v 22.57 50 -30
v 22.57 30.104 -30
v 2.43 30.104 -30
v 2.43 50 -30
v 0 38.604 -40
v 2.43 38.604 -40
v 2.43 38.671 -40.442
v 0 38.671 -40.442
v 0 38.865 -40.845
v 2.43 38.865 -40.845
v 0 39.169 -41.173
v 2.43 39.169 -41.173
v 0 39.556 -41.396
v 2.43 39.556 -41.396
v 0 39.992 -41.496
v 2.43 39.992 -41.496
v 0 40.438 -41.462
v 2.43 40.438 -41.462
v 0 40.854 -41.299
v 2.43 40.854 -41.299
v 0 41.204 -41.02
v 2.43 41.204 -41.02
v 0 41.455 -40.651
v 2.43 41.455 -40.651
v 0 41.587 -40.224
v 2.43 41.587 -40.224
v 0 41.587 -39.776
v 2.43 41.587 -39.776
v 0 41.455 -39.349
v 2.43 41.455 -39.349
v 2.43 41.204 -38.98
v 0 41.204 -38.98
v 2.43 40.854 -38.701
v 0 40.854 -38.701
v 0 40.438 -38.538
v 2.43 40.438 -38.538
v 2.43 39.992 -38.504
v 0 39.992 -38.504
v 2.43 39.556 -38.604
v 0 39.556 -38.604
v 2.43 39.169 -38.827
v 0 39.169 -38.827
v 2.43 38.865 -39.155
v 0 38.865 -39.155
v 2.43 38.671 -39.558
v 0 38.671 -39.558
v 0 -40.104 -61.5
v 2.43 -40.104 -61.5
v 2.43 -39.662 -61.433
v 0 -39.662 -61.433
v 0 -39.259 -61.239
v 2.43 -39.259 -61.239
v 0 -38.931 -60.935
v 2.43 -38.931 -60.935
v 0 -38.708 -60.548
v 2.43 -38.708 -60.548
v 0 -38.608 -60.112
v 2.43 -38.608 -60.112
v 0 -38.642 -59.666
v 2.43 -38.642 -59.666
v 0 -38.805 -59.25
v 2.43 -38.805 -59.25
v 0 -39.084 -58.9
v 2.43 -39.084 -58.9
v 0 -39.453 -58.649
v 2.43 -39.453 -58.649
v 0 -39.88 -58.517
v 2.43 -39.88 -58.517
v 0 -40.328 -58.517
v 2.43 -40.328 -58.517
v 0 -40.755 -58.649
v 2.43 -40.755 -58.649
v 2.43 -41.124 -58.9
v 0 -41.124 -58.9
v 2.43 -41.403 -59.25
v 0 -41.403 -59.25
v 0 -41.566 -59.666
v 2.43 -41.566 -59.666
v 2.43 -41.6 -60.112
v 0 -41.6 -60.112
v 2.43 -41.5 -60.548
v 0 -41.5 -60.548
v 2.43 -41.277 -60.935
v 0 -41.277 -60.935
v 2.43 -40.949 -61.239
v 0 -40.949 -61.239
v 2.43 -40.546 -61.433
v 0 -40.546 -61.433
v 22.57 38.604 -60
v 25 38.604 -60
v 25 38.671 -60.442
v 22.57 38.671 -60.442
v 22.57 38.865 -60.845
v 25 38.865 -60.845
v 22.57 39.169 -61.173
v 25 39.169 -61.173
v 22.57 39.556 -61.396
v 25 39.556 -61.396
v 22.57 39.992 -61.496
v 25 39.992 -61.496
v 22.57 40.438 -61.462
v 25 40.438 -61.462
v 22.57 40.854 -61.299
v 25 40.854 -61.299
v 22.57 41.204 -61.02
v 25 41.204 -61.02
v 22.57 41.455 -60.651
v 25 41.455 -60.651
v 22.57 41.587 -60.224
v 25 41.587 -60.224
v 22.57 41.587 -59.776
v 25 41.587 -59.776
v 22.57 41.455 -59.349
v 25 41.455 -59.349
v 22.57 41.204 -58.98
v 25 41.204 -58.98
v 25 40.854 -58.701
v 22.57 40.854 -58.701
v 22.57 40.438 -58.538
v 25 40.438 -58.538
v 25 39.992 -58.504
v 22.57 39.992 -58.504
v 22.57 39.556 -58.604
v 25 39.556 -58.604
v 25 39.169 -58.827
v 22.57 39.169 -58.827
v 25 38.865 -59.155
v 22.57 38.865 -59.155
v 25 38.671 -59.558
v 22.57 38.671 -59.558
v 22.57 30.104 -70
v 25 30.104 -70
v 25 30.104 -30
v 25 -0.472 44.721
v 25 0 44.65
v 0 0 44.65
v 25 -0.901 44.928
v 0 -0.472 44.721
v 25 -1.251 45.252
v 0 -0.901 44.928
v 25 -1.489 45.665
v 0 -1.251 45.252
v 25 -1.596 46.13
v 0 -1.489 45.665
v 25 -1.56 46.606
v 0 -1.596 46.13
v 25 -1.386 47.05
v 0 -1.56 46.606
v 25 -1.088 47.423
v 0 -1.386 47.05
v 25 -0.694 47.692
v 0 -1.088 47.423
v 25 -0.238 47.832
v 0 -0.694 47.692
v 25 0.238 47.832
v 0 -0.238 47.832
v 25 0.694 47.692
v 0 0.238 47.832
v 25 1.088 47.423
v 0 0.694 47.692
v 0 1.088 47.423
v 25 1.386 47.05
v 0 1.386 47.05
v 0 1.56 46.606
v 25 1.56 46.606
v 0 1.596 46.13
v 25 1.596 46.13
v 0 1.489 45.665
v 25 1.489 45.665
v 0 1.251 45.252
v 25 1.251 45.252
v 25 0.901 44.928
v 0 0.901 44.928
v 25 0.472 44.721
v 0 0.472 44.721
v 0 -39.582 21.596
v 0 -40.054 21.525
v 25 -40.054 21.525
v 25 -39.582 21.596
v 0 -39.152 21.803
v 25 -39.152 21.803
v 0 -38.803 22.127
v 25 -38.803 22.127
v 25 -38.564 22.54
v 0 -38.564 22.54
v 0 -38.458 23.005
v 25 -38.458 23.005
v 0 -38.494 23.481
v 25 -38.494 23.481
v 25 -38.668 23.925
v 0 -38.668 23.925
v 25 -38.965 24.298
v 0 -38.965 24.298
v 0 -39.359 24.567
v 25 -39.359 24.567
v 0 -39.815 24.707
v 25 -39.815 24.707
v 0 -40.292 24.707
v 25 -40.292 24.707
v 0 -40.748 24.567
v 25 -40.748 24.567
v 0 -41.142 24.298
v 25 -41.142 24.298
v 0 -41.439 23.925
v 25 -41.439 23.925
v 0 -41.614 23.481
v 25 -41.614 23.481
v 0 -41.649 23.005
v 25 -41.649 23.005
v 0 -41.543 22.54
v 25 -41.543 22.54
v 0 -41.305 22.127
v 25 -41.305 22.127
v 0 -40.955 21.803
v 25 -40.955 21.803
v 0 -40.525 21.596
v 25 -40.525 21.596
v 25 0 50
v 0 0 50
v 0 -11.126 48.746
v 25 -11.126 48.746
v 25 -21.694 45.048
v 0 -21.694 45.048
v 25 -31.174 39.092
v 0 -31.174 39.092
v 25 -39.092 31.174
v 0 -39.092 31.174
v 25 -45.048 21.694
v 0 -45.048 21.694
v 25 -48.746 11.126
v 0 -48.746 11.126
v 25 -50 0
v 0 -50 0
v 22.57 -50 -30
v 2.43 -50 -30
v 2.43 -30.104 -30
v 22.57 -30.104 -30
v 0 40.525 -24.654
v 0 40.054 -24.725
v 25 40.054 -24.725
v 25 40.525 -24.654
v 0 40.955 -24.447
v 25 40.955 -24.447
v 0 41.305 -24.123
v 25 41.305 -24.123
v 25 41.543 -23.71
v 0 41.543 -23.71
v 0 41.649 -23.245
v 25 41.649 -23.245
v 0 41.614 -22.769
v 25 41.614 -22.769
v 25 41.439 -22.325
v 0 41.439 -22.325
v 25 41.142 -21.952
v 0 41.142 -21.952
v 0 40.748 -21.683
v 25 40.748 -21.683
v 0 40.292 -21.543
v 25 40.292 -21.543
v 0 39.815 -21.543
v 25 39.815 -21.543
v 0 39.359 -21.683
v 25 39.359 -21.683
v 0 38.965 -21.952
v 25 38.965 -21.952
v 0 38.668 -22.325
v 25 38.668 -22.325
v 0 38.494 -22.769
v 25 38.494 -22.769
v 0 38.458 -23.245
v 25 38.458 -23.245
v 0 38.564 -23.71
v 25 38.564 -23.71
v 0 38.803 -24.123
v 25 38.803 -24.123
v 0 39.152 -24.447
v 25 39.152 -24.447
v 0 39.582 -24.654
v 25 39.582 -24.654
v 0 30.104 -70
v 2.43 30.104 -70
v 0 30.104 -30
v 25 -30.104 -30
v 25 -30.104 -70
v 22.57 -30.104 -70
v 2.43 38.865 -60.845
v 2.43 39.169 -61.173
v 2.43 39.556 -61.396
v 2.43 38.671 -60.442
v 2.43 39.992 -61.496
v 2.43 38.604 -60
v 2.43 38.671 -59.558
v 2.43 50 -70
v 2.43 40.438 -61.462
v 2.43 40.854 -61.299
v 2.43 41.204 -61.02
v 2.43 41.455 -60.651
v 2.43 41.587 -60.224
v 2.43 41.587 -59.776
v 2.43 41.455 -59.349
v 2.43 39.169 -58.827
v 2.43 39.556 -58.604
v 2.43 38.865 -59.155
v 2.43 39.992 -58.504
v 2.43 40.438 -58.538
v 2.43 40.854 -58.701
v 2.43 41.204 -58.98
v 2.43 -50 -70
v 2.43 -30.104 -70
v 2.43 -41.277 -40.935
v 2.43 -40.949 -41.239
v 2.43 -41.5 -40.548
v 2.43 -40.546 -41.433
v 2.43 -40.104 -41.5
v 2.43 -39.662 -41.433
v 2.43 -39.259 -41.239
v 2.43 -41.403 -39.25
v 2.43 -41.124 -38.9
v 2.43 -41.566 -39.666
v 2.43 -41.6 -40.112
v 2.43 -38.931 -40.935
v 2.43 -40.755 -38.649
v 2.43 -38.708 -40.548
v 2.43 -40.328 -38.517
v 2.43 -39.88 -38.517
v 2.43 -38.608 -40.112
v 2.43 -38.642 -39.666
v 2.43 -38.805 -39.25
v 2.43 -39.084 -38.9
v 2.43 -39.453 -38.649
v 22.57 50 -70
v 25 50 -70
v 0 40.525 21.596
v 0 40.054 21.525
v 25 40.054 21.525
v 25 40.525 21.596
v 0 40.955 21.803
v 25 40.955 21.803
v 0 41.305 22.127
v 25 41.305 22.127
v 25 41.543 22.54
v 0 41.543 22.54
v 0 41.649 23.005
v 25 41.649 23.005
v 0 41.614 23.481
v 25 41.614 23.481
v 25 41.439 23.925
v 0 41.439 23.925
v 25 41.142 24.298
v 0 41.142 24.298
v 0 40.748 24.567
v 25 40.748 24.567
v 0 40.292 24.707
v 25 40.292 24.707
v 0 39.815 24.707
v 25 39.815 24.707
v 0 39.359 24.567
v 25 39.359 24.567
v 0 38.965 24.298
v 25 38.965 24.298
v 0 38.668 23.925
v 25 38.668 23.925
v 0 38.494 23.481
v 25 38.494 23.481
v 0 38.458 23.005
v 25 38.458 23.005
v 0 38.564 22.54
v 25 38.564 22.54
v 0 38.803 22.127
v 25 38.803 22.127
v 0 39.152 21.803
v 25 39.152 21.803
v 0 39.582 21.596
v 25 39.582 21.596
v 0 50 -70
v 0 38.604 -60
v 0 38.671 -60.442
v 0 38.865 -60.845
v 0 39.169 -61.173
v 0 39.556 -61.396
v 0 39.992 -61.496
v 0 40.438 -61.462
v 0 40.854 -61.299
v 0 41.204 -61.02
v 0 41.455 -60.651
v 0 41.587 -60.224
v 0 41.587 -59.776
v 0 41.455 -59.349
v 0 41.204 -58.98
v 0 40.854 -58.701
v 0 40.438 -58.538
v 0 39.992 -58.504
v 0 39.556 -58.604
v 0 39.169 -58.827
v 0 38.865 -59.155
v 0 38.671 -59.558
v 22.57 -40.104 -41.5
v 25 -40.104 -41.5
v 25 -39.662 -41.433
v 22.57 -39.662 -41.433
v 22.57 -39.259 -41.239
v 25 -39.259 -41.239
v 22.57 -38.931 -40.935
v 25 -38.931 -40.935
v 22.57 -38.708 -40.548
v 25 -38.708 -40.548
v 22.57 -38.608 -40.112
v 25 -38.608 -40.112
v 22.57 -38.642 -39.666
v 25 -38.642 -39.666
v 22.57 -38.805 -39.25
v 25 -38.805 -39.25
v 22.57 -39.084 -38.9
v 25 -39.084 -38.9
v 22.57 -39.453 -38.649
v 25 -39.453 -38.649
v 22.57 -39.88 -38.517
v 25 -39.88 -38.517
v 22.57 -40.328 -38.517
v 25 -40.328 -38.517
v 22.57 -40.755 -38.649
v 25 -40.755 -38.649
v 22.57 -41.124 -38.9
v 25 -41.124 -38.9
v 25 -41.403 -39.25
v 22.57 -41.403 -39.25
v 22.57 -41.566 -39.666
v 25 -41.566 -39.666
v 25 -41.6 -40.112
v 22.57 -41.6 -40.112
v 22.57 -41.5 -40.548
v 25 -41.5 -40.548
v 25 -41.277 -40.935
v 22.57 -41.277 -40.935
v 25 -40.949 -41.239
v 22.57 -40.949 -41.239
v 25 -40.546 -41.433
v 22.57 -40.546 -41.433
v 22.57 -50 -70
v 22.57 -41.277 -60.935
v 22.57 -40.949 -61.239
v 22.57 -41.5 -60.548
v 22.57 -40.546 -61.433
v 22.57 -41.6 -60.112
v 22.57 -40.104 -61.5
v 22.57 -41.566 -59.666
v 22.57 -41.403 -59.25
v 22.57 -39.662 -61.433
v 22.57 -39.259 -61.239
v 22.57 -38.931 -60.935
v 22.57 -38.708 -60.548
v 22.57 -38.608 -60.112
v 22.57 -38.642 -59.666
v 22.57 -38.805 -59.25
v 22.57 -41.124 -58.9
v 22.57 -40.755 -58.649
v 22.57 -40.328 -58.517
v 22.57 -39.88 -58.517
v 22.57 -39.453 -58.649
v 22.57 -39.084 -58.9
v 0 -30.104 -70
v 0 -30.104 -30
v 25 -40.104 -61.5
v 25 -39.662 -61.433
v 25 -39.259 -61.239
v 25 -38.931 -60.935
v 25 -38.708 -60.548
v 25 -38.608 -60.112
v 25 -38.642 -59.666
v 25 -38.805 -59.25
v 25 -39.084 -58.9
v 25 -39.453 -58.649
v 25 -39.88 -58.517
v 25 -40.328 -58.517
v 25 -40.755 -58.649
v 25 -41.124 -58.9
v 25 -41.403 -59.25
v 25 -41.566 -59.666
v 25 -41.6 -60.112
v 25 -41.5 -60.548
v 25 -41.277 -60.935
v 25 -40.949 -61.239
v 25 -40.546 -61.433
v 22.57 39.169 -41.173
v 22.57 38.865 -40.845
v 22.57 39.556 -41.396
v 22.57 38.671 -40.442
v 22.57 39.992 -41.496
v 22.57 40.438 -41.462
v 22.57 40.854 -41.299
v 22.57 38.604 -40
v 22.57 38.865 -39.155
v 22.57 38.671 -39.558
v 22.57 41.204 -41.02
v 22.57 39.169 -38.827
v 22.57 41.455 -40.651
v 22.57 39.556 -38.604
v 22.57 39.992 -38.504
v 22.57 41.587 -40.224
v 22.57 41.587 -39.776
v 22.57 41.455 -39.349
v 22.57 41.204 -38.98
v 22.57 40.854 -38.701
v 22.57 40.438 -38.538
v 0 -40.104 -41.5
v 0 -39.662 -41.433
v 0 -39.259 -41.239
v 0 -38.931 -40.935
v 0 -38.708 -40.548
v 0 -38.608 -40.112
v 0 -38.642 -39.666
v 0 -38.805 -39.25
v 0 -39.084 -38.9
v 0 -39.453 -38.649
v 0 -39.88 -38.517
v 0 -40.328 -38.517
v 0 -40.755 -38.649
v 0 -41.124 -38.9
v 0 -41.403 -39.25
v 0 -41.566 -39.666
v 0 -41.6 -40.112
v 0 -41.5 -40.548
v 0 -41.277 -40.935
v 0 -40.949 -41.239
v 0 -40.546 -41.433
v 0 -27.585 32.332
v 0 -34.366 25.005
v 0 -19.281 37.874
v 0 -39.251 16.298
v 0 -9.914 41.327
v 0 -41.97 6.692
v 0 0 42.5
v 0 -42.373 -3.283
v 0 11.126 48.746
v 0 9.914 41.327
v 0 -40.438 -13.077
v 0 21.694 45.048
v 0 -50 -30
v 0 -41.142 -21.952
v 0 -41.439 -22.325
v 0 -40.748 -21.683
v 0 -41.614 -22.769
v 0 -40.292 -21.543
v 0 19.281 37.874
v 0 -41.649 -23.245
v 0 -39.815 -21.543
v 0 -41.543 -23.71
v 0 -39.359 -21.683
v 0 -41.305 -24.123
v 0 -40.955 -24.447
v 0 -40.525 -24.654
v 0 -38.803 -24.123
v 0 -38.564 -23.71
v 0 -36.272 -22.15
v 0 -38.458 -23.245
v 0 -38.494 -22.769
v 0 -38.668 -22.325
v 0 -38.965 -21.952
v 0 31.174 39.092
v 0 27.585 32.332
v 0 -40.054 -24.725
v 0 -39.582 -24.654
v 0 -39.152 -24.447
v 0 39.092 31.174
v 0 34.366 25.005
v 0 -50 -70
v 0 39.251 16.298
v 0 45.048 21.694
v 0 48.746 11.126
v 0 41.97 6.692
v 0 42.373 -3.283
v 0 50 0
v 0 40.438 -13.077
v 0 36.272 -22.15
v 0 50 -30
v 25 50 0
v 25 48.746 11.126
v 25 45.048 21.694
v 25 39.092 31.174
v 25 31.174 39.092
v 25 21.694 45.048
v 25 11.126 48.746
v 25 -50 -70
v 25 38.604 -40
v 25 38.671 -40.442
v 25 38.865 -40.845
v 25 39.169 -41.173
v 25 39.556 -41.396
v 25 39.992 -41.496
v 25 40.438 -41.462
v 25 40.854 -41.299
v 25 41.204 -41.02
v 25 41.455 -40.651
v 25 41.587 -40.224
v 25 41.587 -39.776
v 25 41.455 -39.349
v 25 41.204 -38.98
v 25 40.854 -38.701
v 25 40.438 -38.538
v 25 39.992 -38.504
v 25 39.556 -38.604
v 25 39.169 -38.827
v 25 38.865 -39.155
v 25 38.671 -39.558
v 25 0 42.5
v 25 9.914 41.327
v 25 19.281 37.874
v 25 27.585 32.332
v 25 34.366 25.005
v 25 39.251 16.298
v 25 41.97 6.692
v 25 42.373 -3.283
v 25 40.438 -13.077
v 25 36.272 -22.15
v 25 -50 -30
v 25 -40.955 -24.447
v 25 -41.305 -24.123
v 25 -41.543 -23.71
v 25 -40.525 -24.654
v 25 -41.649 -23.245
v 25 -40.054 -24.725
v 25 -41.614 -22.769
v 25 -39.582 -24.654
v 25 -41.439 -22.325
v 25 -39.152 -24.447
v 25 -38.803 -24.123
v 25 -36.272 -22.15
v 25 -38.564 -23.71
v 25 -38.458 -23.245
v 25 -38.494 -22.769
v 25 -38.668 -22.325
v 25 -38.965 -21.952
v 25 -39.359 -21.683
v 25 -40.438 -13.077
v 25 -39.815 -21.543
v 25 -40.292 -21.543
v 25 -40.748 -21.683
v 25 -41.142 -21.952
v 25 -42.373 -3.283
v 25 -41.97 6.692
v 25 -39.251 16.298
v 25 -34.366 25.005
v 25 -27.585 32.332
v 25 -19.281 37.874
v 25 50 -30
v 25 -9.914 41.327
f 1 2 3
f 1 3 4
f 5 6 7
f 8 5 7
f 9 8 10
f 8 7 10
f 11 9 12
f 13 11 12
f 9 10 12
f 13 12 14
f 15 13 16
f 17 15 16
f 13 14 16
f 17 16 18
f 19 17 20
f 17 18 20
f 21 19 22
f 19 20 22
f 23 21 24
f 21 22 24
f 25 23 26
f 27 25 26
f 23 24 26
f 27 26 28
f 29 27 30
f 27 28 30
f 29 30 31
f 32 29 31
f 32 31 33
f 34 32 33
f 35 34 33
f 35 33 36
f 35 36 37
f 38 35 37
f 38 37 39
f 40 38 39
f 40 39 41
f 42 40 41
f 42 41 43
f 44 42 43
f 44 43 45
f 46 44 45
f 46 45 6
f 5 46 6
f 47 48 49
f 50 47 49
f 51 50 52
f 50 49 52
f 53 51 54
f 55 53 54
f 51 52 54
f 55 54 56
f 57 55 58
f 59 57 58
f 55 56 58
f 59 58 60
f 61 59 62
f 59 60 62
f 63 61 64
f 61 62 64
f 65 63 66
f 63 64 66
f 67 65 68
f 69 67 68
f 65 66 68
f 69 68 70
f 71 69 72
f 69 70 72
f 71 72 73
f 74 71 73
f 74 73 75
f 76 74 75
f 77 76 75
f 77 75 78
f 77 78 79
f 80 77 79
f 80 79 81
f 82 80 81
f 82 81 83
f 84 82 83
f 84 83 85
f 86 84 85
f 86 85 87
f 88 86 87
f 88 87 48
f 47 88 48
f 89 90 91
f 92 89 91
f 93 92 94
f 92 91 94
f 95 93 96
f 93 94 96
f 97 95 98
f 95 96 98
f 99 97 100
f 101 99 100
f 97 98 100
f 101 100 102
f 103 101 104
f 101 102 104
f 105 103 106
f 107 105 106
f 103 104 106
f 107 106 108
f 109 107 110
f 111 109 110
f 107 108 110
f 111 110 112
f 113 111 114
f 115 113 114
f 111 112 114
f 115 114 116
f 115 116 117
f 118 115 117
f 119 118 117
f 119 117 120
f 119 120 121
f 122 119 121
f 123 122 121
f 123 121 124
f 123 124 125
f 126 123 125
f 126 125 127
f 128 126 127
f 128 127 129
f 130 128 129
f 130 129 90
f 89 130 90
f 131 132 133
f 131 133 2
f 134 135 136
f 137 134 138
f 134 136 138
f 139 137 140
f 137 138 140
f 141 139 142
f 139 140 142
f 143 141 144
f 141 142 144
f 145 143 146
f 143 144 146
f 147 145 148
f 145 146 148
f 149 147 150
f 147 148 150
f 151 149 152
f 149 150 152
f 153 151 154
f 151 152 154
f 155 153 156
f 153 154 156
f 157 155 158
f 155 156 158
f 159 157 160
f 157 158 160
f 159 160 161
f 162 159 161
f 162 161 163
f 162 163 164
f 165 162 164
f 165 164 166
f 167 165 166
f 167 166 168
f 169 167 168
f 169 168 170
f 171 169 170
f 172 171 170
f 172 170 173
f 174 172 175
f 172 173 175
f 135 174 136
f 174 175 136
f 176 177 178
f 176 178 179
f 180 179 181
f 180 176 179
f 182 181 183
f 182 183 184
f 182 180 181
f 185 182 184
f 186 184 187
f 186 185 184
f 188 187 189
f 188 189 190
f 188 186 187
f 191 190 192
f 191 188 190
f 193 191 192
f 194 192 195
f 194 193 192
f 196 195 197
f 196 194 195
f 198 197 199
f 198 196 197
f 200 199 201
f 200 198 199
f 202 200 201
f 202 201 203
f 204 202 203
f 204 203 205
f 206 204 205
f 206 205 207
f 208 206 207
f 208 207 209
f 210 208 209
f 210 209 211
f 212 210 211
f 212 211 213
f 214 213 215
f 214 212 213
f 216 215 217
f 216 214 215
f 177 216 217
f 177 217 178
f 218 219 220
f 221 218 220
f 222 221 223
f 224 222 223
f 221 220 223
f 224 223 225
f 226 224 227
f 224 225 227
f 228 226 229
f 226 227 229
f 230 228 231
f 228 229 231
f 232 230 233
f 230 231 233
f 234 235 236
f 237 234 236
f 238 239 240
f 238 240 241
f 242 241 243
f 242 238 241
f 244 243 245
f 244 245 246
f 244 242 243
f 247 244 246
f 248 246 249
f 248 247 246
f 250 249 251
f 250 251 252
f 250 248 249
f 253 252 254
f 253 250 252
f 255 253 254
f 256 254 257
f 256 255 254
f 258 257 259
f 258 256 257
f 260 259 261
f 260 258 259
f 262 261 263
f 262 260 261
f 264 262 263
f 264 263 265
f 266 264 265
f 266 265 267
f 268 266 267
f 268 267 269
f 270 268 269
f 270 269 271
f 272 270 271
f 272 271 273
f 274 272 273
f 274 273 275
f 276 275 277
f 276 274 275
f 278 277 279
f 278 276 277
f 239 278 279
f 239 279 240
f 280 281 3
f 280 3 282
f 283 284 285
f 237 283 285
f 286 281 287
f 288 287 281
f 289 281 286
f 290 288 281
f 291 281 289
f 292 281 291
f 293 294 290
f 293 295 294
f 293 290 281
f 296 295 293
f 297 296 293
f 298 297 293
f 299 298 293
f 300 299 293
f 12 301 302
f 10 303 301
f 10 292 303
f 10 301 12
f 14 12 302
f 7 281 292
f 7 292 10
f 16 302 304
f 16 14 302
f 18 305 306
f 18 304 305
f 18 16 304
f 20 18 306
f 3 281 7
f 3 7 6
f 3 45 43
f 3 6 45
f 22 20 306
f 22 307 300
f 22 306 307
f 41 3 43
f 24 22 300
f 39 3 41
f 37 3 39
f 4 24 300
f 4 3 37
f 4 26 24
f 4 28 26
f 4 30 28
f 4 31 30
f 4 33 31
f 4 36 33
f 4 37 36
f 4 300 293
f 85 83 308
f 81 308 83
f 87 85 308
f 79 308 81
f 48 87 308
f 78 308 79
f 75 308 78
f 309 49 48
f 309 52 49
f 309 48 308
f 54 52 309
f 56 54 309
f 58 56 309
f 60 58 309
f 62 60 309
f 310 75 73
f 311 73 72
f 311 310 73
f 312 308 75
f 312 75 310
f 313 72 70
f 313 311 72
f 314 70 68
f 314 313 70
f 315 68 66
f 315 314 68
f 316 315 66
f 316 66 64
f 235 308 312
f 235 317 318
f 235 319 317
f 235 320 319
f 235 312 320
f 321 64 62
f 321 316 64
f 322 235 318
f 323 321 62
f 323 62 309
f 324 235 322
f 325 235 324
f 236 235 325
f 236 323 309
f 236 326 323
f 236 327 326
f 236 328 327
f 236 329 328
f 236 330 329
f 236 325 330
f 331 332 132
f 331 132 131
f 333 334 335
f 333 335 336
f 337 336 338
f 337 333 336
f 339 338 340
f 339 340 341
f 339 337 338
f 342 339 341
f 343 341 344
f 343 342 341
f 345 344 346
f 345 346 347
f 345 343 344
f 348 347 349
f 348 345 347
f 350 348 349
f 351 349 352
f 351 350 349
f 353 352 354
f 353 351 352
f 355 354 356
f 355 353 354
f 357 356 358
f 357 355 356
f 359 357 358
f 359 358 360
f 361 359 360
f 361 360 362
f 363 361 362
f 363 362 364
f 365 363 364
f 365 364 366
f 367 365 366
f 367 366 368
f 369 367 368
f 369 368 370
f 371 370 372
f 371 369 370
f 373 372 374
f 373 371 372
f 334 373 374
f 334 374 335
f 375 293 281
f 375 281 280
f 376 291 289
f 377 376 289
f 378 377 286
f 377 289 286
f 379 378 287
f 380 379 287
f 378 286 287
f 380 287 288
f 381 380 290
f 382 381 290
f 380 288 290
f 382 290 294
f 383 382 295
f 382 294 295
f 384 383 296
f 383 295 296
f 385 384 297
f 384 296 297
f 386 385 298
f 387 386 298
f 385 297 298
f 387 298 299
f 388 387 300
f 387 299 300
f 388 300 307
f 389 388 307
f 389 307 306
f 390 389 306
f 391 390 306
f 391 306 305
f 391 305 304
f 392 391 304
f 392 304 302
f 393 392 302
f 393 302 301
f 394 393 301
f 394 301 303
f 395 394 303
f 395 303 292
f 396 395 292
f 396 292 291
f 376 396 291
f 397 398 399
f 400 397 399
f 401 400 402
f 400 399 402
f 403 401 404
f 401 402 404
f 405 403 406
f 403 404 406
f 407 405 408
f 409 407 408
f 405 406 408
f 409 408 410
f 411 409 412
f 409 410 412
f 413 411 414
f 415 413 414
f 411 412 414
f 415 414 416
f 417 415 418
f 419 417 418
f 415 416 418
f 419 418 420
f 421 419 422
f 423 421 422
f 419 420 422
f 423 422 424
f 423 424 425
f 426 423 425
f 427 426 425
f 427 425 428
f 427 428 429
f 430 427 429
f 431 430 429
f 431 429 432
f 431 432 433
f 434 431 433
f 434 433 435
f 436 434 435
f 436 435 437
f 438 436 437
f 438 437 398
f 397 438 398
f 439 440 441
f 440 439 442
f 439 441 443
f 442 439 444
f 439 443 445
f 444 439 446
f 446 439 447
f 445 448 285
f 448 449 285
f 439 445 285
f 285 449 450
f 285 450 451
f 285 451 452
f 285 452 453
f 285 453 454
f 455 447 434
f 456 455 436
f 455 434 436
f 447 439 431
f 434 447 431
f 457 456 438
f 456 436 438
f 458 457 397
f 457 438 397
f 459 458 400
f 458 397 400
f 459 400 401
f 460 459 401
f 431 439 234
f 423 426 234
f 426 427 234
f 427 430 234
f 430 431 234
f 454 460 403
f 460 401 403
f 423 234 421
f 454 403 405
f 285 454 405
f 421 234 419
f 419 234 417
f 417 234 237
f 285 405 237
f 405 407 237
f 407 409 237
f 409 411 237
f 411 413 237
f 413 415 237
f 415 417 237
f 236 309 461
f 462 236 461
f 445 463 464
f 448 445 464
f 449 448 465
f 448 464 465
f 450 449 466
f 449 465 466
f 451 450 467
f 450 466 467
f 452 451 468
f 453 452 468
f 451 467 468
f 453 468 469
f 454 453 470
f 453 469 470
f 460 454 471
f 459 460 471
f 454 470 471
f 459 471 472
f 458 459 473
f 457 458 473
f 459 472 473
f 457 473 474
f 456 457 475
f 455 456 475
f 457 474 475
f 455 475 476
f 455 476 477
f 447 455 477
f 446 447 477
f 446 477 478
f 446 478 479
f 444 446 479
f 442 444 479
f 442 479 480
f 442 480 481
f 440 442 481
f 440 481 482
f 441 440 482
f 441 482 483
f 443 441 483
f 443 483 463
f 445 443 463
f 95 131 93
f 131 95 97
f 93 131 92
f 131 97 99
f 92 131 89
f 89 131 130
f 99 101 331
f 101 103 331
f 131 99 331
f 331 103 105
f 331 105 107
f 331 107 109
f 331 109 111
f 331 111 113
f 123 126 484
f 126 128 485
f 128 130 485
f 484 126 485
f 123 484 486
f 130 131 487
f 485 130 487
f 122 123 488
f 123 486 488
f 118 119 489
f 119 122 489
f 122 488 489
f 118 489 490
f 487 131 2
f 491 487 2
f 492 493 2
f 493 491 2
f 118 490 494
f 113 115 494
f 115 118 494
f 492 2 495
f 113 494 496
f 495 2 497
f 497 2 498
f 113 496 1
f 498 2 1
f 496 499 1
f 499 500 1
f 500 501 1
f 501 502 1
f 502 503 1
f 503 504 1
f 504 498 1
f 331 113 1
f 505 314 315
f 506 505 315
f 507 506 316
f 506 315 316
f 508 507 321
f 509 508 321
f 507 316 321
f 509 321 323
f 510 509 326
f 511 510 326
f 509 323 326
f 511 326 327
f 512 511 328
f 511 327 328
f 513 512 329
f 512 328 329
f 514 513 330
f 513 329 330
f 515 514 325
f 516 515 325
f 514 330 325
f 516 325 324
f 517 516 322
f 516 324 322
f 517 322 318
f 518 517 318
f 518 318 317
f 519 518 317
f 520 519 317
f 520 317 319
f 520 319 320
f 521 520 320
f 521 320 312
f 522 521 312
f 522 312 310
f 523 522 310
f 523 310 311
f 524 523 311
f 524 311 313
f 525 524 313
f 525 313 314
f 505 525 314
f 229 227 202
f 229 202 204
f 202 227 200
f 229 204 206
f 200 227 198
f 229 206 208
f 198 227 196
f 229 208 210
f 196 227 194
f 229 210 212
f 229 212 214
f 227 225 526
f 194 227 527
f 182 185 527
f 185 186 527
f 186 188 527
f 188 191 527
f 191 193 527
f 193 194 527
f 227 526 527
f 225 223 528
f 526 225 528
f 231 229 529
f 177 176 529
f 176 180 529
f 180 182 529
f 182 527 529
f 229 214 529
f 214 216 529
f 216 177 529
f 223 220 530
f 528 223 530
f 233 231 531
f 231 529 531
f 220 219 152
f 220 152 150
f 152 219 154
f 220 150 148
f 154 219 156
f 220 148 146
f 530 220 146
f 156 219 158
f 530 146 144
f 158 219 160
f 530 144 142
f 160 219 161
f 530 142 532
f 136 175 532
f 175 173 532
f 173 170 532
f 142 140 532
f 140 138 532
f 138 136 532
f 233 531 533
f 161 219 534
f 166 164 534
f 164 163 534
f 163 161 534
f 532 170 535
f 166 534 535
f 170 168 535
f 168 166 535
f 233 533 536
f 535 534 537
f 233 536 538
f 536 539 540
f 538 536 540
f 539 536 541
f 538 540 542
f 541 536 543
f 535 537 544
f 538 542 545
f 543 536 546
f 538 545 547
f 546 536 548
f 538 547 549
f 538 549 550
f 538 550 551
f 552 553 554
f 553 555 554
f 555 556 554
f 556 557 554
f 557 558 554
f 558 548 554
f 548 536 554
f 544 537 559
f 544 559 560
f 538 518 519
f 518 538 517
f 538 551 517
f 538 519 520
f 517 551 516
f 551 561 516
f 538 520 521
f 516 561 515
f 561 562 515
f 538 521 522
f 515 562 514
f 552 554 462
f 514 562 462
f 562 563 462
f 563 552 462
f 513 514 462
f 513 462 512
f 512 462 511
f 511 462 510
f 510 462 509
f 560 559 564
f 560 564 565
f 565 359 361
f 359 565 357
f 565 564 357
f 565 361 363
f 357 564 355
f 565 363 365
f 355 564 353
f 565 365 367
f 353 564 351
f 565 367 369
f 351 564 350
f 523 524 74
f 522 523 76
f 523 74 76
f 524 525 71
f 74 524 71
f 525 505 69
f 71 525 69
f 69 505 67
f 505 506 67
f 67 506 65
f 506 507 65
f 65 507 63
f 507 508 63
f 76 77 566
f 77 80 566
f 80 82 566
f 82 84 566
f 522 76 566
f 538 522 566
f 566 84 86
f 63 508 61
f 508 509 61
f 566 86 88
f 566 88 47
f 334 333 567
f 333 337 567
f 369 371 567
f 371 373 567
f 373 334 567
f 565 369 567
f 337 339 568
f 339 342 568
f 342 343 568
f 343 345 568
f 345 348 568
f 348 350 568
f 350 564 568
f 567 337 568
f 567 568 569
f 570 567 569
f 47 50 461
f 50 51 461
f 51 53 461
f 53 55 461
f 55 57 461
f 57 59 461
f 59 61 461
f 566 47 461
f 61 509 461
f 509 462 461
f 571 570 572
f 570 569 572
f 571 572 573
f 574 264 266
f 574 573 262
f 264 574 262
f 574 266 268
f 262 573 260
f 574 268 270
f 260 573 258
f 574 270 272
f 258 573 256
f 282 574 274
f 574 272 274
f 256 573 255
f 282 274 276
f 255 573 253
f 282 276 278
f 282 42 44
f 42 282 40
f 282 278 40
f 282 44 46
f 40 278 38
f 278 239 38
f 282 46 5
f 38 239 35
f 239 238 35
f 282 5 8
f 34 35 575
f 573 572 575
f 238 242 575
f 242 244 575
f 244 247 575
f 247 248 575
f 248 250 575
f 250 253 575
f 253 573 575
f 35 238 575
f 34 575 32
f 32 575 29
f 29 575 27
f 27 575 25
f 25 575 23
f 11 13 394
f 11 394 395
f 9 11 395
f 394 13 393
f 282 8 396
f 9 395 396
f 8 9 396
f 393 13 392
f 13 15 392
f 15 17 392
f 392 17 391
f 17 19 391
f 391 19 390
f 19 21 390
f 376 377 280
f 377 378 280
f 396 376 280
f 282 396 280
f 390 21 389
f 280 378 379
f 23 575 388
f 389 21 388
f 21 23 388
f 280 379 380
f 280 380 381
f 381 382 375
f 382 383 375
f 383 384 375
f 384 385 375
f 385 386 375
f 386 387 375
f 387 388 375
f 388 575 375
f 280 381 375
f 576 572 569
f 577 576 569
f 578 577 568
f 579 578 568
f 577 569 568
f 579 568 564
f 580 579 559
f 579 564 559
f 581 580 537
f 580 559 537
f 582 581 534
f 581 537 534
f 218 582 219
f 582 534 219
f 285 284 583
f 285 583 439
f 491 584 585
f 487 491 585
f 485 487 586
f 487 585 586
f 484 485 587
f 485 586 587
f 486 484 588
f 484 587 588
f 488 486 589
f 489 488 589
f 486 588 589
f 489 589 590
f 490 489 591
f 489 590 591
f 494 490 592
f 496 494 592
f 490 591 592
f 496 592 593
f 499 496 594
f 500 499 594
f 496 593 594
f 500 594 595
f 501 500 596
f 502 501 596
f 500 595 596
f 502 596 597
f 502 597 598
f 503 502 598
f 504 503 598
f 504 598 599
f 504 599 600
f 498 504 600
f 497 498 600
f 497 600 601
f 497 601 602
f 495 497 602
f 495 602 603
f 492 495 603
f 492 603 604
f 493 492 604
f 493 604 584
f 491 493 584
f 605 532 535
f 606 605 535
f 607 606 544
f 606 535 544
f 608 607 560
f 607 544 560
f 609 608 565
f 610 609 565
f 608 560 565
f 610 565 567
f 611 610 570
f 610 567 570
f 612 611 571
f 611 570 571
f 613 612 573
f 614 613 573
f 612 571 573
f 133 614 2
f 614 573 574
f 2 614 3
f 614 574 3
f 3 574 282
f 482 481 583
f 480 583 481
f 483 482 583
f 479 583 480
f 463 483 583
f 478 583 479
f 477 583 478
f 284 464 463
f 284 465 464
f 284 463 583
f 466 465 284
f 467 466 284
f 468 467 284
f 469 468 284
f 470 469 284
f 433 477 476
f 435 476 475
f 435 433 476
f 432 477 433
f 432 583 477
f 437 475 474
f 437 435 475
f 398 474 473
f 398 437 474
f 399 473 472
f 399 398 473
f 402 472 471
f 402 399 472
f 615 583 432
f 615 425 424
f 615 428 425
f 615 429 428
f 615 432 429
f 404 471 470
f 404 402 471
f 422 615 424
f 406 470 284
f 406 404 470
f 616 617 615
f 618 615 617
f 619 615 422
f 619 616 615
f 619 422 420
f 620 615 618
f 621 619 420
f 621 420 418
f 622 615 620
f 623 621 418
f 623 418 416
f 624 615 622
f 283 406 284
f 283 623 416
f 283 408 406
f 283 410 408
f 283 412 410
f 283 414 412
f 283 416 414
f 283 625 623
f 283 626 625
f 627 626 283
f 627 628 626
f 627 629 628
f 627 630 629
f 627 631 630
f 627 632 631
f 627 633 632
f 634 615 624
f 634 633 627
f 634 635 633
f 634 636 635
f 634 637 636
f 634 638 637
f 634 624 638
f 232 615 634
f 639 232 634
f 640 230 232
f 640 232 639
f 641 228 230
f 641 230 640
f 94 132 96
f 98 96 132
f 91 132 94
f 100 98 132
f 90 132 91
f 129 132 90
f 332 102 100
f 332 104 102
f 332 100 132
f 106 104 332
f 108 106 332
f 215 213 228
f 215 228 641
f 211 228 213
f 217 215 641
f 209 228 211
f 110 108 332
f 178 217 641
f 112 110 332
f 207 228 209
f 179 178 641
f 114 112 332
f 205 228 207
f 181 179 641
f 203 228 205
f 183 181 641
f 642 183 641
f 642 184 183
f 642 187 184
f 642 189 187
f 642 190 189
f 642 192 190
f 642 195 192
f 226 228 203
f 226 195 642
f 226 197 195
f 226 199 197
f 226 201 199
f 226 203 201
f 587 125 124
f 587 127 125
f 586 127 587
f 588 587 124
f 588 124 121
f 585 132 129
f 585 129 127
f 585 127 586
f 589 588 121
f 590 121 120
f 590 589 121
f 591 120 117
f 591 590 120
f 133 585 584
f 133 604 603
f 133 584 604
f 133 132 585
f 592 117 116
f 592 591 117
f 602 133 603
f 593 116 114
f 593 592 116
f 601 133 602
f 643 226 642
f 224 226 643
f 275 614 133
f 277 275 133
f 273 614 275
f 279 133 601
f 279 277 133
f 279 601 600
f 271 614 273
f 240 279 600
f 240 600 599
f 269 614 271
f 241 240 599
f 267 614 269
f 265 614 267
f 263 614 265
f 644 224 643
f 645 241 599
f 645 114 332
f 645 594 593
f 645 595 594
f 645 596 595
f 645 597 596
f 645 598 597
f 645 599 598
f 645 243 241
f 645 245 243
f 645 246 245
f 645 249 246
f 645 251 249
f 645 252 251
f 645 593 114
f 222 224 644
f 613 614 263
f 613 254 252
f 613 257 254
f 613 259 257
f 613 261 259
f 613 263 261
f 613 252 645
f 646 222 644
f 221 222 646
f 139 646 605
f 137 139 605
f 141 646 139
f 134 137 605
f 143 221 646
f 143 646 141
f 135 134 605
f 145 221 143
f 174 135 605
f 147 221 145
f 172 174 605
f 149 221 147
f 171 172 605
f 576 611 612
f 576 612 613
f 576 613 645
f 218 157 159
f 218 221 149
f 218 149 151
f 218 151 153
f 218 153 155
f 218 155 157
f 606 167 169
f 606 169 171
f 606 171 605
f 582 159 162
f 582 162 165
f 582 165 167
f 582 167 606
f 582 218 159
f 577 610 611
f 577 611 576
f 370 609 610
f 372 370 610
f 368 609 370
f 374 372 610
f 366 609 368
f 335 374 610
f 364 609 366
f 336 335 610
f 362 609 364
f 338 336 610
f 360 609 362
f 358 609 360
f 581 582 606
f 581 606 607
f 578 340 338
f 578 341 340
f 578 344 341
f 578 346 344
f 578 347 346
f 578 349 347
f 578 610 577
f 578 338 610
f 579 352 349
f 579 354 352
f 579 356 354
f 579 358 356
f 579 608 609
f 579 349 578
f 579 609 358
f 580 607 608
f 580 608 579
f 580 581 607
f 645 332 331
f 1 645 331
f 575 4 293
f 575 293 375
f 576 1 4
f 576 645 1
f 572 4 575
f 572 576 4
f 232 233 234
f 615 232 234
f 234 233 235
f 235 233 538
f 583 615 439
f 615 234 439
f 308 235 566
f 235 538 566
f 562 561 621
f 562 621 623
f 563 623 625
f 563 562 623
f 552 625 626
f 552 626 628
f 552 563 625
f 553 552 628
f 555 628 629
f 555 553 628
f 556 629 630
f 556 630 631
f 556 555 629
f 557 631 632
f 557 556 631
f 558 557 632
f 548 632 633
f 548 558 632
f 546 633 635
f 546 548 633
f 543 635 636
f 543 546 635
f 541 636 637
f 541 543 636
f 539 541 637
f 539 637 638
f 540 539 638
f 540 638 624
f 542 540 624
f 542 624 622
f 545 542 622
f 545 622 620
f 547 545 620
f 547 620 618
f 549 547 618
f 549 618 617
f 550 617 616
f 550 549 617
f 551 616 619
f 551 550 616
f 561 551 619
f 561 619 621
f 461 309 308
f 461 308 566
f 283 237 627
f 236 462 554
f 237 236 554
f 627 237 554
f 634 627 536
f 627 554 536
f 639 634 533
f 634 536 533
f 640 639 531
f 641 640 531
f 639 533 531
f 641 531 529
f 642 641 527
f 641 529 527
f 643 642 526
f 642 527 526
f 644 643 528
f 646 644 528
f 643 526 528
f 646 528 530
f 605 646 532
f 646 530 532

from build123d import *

# Parameters (mm, degrees)
SKETCH_1_R          = 1.6
EXTRUDE_1_DEPTH     = 25
SKETCH_2_W          = 2.43
SKETCH_2_H          = 19.896013553
EXTRUDE_2_DEPTH     = 40
SKETCH_4_R          = 1.5
CUT_EXTRUDE_4_DEPTH = 90.582364336


with BuildPart() as part:
    # 草图1 → 凸台-拉伸1 (new body)
    # profile 1 of 2: a face of its own
    with BuildSketch(Plane(origin=(0, 0, 0), x_dir=(0, 0, -1), z_dir=(1, 0, 0))):
        with BuildLine():
            ThreePointArc((-47.85, 0), (-46.25, 1.6), (-44.65, 0))
            Line((-44.65, 0), (-42.5, 0))
            ThreePointArc((-42.5, 0), (-16.298006013, 39.25079617), (30, 30.103986447))
            Line((30, 30.103986447), (30, 50))
            Line((30, 50), (0, 50))
            ThreePointArc((0, 50), (-35.355339059, 35.355339059), (-50, 0))
            Line((-50, 0), (-47.85, 0))
        make_face()
        with Locations((-23.125, 40.053674925)):
            Circle(SKETCH_1_R, mode=Mode.SUBTRACT)
        with Locations((23.125, 40.053674925)):
            Circle(SKETCH_1_R, mode=Mode.SUBTRACT)
    # profile 2 of 2: a face of its own
    with BuildSketch(Plane(origin=(0, 0, 0), x_dir=(0, 0, -1), z_dir=(1, 0, 0))):
        with BuildLine():
            Line((-42.5, 0), (-44.65, 0))
            ThreePointArc((-44.65, 0), (-46.25, -1.6), (-47.85, 0))
            Line((-47.85, 0), (-50, 0))
            ThreePointArc((-50, 0), (-35.355339059, -35.355339059), (0, -50))
            Line((0, -50), (30, -50))
            Line((30, -50), (30, -30.103986447))
            ThreePointArc((30, -30.103986447), (-16.298006013, -39.25079617), (-42.5, 0))
        make_face()
        with Locations((-23.125, -40.053674925)):
            Circle(SKETCH_1_R, mode=Mode.SUBTRACT)
        with Locations((23.125, -40.053674925)):
            Circle(SKETCH_1_R, mode=Mode.SUBTRACT)
    extrude(amount=EXTRUDE_1_DEPTH)

    # 草图2 → 凸台-拉伸2 (add)
    with BuildSketch(Plane(origin=(0, 0, -30), x_dir=(-1, 0, 0), z_dir=(0, 0, -1))):
        with Locations((-23.785, 40.051993223)):
            Rectangle(SKETCH_2_W, SKETCH_2_H)
        with Locations((-1.215, 40.051993223)):
            Rectangle(SKETCH_2_W, SKETCH_2_H)
        with Locations((-1.215, -40.051993223)):
            Rectangle(SKETCH_2_W, SKETCH_2_H)
        with Locations((-23.785, -40.051993223)):
            Rectangle(SKETCH_2_W, SKETCH_2_H)
    extrude(amount=EXTRUDE_2_DEPTH)

    # 草图4 → 切除-拉伸4 (cut, through all)
    with BuildSketch(Plane(origin=(25, 0, 0), x_dir=(0, 0, -1), z_dir=(1, 0, 0))):
        with Locations((60, -40.103986447)):
            Circle(SKETCH_4_R)
        with Locations((40, -40.103986447)):
            Circle(SKETCH_4_R)
        with Locations(Location((40, 40.103986447, 0), (0, 0, 270))):
            Circle(SKETCH_4_R)
        with Locations(Location((60, 40.103986447, 0), (0, 0, 270))):
            Circle(SKETCH_4_R)
    extrude(amount=-CUT_EXTRUDE_4_DEPTH, mode=Mode.SUBTRACT)


solid = part.part
